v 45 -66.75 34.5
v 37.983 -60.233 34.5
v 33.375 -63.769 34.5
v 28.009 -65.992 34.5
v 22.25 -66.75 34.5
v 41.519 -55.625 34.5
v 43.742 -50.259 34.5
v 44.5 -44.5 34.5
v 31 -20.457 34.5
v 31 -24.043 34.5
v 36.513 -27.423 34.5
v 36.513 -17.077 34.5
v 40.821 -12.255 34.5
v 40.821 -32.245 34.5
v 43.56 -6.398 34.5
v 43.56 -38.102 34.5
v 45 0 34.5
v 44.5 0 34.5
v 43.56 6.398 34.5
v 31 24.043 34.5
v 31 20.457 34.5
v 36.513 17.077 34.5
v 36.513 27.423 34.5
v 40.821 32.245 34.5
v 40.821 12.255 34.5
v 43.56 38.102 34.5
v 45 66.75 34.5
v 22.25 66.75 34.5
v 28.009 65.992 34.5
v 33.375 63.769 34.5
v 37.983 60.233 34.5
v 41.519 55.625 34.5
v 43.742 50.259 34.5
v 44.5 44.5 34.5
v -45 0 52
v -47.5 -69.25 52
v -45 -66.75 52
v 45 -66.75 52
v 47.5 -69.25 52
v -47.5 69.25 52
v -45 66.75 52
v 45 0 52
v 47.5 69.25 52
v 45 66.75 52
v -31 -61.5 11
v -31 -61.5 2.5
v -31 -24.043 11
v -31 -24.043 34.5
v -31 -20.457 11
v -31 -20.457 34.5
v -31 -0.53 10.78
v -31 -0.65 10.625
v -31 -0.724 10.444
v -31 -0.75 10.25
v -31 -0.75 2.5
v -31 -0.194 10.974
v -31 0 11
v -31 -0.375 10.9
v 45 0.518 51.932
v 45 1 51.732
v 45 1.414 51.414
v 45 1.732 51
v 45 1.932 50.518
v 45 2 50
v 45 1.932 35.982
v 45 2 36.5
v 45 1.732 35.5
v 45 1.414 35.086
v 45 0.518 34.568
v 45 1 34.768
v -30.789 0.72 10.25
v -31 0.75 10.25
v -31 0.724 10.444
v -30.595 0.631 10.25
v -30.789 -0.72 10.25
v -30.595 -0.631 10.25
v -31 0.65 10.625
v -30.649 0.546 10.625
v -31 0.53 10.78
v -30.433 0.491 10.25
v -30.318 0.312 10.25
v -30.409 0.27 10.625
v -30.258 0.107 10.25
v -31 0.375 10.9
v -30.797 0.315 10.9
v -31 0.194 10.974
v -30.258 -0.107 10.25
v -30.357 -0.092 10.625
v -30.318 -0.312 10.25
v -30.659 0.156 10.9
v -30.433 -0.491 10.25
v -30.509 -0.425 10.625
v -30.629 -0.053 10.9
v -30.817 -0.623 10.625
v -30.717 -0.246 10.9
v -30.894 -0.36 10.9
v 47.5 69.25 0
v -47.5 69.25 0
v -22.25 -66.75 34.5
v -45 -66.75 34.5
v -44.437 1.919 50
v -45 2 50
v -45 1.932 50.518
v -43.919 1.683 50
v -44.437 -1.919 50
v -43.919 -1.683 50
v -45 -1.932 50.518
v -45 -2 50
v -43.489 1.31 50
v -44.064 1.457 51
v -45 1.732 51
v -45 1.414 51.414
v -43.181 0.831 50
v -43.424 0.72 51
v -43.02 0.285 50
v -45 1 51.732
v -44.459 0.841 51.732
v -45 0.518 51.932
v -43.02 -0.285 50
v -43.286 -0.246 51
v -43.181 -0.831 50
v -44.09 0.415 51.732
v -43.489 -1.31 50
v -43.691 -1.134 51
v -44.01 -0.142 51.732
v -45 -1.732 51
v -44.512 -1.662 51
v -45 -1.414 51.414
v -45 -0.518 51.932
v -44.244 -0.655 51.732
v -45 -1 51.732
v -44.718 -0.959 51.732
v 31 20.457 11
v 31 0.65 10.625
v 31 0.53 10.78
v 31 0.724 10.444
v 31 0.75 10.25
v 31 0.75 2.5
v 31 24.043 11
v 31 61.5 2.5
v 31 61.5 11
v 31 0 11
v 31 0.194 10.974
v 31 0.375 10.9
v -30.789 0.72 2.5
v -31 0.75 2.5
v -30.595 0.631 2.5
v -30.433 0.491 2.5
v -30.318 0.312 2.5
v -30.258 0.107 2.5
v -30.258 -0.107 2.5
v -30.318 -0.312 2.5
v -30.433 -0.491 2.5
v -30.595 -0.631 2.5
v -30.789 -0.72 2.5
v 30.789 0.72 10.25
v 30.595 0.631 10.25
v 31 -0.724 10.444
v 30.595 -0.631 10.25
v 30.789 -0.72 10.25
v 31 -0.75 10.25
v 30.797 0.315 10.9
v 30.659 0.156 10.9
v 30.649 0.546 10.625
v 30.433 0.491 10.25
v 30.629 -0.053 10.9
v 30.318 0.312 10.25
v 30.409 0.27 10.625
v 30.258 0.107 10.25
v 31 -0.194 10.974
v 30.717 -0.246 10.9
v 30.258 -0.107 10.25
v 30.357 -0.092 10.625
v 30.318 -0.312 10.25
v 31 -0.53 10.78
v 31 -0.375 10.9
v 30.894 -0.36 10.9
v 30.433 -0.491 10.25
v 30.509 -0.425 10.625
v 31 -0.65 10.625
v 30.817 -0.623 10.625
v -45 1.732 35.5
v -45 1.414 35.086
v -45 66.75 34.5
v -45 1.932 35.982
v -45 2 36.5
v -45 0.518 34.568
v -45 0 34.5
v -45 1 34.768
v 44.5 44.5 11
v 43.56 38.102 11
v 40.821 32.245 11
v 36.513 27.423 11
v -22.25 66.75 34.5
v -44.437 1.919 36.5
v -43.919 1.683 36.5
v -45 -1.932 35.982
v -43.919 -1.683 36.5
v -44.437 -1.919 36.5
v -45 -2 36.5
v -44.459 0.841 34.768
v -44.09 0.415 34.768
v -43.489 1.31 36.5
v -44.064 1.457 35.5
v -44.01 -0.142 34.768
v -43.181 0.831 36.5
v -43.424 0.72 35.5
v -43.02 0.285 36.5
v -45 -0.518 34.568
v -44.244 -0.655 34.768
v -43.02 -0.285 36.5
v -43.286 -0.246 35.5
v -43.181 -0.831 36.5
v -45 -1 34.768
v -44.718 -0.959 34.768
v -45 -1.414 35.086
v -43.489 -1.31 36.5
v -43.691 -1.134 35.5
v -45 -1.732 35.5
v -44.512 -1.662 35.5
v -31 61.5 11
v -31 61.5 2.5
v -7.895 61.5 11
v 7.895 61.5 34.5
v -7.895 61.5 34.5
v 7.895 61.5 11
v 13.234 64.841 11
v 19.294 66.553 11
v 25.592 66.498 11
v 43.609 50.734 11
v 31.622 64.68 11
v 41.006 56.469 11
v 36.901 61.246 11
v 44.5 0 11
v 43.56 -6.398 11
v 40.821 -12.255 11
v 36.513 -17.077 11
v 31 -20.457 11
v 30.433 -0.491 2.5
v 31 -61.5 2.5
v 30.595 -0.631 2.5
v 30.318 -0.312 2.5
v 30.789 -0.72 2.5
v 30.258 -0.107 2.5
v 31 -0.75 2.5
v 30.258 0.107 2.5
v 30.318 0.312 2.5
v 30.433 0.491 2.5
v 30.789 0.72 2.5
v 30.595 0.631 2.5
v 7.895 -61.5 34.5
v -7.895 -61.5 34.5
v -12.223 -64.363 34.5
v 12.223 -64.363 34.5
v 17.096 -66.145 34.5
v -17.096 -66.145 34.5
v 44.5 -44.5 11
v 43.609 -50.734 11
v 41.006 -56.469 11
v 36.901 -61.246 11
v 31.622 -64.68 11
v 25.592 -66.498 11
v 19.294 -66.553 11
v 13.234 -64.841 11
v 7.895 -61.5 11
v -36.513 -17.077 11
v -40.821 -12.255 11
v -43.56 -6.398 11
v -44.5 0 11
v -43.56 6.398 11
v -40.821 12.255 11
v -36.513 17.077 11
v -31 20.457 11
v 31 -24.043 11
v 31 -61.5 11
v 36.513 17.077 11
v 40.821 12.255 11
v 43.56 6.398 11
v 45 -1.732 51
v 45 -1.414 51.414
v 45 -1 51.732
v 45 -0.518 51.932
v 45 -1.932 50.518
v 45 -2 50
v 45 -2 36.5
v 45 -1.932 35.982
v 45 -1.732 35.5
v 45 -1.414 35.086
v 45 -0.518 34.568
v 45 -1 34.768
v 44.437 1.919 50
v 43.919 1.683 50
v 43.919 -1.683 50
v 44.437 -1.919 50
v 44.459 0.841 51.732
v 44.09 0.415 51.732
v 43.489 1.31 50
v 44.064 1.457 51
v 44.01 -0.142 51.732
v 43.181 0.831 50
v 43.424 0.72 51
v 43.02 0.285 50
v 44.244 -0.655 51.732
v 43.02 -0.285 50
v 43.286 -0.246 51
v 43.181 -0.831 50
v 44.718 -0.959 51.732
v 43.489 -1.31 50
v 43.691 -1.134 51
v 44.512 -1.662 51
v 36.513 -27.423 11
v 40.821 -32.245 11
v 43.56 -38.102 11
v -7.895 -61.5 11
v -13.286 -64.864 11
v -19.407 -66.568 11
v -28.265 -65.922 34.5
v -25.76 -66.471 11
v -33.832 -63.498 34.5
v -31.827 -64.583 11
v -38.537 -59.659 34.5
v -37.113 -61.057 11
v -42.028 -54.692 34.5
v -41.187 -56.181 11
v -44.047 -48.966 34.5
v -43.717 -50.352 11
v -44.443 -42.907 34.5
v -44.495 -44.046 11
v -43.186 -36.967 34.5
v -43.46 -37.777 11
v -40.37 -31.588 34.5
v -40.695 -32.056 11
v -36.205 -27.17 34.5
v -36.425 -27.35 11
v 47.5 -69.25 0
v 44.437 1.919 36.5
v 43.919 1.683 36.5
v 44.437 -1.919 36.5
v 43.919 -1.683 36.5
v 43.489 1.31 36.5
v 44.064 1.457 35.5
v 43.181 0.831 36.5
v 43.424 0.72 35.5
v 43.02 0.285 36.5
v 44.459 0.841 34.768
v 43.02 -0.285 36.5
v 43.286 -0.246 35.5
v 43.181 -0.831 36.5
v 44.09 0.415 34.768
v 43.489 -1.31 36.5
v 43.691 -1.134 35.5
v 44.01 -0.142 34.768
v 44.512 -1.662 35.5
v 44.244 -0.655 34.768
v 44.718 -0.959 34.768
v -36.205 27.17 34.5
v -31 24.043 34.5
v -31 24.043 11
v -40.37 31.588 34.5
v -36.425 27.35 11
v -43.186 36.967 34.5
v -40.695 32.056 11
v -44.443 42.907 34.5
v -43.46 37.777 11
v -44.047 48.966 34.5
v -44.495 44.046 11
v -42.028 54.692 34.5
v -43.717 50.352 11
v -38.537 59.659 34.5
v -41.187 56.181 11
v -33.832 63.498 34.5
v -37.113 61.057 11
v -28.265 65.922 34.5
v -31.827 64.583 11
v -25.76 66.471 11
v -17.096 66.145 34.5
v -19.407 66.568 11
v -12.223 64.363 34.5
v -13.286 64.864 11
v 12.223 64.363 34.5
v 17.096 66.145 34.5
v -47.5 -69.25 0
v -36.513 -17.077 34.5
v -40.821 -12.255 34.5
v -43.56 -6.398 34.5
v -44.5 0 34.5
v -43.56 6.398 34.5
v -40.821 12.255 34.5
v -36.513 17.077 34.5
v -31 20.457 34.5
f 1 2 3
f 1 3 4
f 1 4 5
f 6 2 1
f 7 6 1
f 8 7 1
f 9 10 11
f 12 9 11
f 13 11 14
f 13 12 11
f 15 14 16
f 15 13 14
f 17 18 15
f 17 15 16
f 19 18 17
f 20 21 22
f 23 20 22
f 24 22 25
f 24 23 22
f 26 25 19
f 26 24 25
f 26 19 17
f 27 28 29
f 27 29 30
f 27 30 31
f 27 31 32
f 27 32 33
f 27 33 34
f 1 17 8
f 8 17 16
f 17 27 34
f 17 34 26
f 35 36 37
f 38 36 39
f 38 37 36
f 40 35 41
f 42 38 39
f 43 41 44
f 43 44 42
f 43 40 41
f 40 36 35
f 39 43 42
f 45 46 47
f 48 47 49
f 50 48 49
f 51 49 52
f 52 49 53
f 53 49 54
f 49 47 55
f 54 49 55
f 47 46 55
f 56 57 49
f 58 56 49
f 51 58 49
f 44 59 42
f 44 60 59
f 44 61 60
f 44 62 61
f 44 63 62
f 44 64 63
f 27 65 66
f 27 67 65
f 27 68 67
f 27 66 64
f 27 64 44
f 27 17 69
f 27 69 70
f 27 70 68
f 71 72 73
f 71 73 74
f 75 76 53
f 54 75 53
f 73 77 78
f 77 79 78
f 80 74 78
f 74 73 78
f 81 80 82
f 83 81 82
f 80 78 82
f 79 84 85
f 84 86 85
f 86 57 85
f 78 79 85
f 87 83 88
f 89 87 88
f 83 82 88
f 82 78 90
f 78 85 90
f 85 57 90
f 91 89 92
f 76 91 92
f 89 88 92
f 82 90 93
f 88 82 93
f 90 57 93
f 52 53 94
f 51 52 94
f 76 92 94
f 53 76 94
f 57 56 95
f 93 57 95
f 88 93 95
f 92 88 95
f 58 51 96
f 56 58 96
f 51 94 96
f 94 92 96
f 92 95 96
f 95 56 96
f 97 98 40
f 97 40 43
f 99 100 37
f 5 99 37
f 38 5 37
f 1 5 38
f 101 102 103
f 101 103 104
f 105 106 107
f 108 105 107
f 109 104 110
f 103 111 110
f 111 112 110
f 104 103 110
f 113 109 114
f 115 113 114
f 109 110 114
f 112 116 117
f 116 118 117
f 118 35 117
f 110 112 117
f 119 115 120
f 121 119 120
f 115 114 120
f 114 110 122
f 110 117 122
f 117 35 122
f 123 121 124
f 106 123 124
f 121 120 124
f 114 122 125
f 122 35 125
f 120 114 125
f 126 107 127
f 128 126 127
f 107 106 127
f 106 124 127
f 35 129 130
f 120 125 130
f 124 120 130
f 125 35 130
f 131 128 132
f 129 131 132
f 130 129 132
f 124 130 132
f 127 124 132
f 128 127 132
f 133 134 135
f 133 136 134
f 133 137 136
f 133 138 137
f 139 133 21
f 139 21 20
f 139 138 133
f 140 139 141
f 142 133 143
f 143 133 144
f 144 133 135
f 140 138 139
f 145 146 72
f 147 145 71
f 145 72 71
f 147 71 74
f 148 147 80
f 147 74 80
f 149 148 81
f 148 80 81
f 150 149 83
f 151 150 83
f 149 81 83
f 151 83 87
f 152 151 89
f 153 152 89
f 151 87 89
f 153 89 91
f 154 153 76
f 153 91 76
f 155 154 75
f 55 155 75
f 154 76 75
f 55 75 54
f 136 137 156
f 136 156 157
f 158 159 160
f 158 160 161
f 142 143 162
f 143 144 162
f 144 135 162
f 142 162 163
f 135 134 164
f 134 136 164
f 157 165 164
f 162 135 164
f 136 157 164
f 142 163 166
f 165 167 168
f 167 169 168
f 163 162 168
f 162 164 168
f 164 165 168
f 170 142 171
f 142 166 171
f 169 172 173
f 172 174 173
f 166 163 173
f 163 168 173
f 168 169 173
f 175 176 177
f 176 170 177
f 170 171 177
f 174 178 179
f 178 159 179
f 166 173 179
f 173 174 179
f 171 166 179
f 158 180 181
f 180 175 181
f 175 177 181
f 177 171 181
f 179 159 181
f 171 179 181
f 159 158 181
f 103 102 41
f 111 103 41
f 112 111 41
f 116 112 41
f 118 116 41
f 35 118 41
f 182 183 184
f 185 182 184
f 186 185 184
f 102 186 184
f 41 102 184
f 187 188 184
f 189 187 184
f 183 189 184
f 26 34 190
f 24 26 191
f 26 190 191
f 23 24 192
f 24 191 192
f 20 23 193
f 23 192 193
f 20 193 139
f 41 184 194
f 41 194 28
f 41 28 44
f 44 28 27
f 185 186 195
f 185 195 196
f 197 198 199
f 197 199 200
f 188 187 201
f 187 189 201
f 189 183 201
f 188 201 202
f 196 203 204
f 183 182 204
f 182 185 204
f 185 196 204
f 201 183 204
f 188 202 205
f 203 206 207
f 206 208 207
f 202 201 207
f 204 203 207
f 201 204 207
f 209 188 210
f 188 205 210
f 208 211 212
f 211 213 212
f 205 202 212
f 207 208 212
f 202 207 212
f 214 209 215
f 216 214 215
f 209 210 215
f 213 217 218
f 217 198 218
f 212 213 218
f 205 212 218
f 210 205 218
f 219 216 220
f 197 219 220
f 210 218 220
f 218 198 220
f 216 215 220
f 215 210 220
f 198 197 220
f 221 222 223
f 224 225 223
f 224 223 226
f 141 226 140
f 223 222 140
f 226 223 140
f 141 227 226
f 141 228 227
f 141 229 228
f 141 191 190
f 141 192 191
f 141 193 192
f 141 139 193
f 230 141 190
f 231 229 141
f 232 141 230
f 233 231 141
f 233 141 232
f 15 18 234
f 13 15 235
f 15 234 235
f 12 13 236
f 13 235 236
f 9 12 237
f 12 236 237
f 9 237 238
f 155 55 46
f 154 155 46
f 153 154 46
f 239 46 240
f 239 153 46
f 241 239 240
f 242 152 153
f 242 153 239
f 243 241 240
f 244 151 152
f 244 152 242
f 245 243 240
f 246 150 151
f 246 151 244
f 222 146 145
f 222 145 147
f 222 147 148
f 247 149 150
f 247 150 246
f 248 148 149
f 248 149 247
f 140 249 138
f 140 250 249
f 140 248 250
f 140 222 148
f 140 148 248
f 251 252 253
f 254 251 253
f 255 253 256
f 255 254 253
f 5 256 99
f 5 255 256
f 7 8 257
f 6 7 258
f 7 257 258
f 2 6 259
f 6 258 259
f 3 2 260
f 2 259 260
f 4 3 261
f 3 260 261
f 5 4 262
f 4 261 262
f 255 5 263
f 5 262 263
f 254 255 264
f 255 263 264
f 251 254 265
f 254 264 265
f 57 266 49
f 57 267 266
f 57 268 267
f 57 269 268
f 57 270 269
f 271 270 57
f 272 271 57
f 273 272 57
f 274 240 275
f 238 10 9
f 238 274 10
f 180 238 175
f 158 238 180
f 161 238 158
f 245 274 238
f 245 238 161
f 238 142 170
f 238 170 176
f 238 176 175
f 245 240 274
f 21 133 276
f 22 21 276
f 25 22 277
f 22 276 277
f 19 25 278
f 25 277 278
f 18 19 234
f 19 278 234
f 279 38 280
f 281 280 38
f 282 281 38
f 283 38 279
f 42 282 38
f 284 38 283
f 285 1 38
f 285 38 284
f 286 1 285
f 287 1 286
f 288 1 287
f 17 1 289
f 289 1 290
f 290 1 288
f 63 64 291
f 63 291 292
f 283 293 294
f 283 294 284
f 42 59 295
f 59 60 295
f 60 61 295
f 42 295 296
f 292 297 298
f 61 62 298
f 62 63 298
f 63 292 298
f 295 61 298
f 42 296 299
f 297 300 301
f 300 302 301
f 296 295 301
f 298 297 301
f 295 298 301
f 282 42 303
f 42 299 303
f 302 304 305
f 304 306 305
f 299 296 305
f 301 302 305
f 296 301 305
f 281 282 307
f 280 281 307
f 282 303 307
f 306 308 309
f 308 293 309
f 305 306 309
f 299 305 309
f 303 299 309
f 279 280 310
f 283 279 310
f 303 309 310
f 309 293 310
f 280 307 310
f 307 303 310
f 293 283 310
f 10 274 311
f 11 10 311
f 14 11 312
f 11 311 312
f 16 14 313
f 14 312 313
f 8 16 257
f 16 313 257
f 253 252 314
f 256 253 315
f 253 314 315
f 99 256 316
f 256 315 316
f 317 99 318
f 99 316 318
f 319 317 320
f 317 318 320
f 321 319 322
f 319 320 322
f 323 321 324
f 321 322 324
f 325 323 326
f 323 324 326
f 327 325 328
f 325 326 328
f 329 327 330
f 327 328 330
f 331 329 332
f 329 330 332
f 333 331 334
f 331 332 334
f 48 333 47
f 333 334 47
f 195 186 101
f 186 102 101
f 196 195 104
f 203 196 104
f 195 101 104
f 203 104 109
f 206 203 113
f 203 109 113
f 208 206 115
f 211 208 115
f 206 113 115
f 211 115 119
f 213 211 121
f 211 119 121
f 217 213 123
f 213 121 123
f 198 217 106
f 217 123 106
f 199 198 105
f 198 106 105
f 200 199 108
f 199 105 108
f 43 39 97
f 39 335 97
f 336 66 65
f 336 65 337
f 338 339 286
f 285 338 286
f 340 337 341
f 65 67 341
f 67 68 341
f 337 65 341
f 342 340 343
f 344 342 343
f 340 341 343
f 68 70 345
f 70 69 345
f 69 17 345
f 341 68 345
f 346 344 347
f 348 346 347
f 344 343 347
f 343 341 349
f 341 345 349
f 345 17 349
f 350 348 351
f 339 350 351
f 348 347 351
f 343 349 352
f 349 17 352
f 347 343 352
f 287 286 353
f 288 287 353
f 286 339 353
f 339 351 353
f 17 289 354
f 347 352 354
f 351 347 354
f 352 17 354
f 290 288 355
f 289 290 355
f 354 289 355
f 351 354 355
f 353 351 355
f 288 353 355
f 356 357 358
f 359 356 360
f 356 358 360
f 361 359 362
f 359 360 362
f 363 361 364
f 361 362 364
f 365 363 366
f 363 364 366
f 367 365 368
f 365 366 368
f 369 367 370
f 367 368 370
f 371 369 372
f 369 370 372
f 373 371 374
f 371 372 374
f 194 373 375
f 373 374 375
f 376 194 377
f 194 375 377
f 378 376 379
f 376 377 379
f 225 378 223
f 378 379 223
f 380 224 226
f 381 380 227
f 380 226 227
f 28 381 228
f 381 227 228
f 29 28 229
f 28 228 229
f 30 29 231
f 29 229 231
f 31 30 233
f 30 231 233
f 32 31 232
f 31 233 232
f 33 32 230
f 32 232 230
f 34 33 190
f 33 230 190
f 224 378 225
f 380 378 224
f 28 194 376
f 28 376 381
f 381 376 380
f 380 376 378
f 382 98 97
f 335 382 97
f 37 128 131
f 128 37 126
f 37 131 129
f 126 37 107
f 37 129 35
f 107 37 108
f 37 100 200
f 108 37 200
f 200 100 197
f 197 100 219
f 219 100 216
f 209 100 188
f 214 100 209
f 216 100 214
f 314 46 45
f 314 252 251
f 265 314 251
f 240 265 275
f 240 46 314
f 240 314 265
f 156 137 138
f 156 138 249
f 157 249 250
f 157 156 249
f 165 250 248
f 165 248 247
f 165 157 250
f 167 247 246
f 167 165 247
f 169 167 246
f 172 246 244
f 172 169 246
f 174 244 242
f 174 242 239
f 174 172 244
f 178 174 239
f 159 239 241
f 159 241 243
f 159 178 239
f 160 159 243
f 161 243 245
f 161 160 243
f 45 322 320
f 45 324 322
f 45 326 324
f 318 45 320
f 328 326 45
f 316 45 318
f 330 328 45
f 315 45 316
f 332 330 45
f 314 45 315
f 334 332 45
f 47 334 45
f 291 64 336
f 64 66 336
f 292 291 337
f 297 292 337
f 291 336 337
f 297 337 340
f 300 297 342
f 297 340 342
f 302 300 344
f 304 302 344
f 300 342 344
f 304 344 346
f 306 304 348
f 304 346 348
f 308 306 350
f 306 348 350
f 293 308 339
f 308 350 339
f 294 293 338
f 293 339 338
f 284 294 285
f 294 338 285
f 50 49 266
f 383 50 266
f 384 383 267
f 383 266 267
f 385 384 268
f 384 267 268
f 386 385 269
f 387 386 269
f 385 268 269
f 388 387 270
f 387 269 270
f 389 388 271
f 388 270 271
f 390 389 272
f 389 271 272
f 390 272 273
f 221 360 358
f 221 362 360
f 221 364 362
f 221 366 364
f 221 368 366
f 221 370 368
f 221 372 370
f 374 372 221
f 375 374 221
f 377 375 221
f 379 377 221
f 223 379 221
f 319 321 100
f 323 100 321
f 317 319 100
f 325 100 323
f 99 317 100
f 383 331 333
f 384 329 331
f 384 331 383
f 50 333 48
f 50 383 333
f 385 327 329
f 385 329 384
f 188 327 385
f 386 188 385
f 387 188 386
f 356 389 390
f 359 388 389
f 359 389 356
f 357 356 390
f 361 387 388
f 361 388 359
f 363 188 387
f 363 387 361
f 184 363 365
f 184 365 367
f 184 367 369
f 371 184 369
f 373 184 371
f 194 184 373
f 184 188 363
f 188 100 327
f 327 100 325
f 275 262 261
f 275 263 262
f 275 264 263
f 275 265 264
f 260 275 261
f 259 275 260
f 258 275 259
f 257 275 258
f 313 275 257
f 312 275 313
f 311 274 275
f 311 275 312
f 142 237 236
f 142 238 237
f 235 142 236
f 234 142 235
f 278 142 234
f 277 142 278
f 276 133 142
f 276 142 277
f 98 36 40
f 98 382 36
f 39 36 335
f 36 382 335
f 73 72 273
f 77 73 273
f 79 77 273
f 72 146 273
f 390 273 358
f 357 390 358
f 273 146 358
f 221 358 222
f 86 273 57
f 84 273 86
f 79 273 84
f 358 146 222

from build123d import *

# Parameters (mm, degrees)
F0_W      = 95
F0_H      = 138.5
F1_DEPTH  = 2.5
F2_W      = 95
F2_H      = 138.5
F2_W_2    = 62
F2_H_2    = 123
F3_DEPTH  = 8.5
F4_W      = 95
F4_H      = 138.5
F5_DEPTH  = 23.5
F6_W      = 62
F6_H      = 123
F7_DEPTH  = 23.501
F8_W      = 95
F8_H      = 138.5
F8_W_2    = 90
F8_H_2    = 133.5
F9_DEPTH  = 17.5
F11_ANGLE = 180
F13_ANGLE = 180
F14_W     = 0.75
F14_H     = 7.75
F16_W     = 0.75
F16_H     = 7.75


with BuildPart() as f1:
    # F0 (on Top) → F1 (new body)
    with BuildSketch(Plane.XY):
        Rectangle(F0_W, F0_H)
    extrude(amount=F1_DEPTH)

    # F2 (on face) → F3 (join)
    with BuildSketch(Plane.XY.offset(2.5)):
        Rectangle(F2_W, F2_H)
        Rectangle(F2_W_2, F2_H_2, mode=Mode.SUBTRACT)
    extrude(amount=F3_DEPTH)

    # F4 (on face) → F5 (join)
    with BuildSketch(Plane.XY.offset(11)):
        with BuildLine():
            ThreePointArc((-22.25, 22.25), (-6.516874, 28.766874), (0, 44.5))
            ThreePointArc((0, 44.5), (-37.983126, 60.233126), (-22.25, 22.25))
        make_face()
        with BuildLine():
            ThreePointArc((44.5, 44.5), (22.25, 66.75), (0, 44.5))
            ThreePointArc((0, 44.5), (6.516874, 28.766874), (22.25, 22.25))
            ThreePointArc((22.25, 22.25), (37.983126, 28.766874), (44.5, 44.5))
        make_face()
        with BuildLine():
            ThreePointArc((0, 0), (-6.516874, 15.733126), (-22.25, 22.25))
            ThreePointArc((-22.25, 22.25), (-44.5, 0), (-22.25, -22.25))
            ThreePointArc((-22.25, -22.25), (-6.516874, -15.733126), (0, 0))
        make_face()
        with BuildLine():
            ThreePointArc((44.5, 0), (37.983126, 15.733126), (22.25, 22.25))
            ThreePointArc((22.25, 22.25), (6.516874, 15.733126), (0, 0))
            ThreePointArc((0, 0), (6.516874, -15.733126), (22.25, -22.25))
            ThreePointArc((22.25, -22.25), (37.983126, -15.733126), (44.5, 0))
        make_face()
        with BuildLine():
            ThreePointArc((0, -44.5), (-6.516874, -28.766874), (-22.25, -22.25))
            ThreePointArc((-22.25, -22.25), (-37.983126, -60.233126), (0, -44.5))
        make_face()
        with BuildLine():
            ThreePointArc((44.5, -44.5), (37.983126, -28.766874), (22.25, -22.25))
            ThreePointArc((22.25, -22.25), (6.516874, -28.766874), (0, -44.5))
            ThreePointArc((0, -44.5), (22.25, -66.75), (44.5, -44.5))
        make_face()
        Rectangle(F4_W, F4_H)
        with BuildLine():
            ThreePointArc((-22.25, 22.25), (-37.983126, 60.233126), (0, 44.5))
            ThreePointArc((0, 44.5), (22.25, 66.75), (44.5, 44.5))
            ThreePointArc((44.5, 44.5), (37.983126, 28.766874), (22.25, 22.25))
            ThreePointArc((22.25, 22.25), (37.983126, 15.733126), (44.5, 0))
            ThreePointArc((44.5, 0), (37.983126, -15.733126), (22.25, -22.25))
            ThreePointArc((22.25, -22.25), (37.983126, -28.766874), (44.5, -44.5))
            ThreePointArc((44.5, -44.5), (22.25, -66.75), (0, -44.5))
            ThreePointArc((0, -44.5), (-37.983126, -60.233126), (-22.25, -22.25))
            ThreePointArc((-22.25, -22.25), (-44.5, 0), (-22.25, 22.25))
        make_face(mode=Mode.SUBTRACT)
    extrude(amount=F5_DEPTH)

    # F6 (on face) → F7 (cut, through all)
    with BuildSketch(Plane.XY.offset(11)):
        Rectangle(F6_W, F6_H)
    extrude(amount=F7_DEPTH, mode=Mode.SUBTRACT)

    # F8 (on face) → F9 (join)
    with BuildSketch(Plane.XY.offset(34.5)):
        Rectangle(F8_W, F8_H)
        Rectangle(F8_W_2, F8_H_2, mode=Mode.SUBTRACT)
    extrude(amount=F9_DEPTH)

    # F10 (on face) → F11 (revolve)
    with BuildSketch(Plane.YZ.offset(-45)):
        with BuildLine():
            Line((0, 36.5), (0, 34.5))
            ThreePointArc((0, 34.5), (1.414214, 35.085786), (2, 36.5))
            Line((2, 36.5), (2, 50))
            ThreePointArc((2, 50), (1.414214, 51.414214), (0, 52))
            Line((0, 52), (0, 50))
            Line((0, 50), (0, 36.5))
        make_face()
    revolve(axis=Axis((-45, 0, 43.25), (0, 0, -1)), revolution_arc=F11_ANGLE)

    # F12 (on face) → F13 (revolve)
    with BuildSketch(Plane(origin=(45, 0, 0), x_dir=(0, -1, 0), z_dir=(-1, 0, 0))):
        with BuildLine():
            ThreePointArc((-2, 36.5), (-1.414214, 35.085786), (0, 34.5))
            Line((0, 34.5), (0, 36.5))
            Line((0, 36.5), (0, 50))
            Line((0, 50), (-2, 50))
            Line((-2, 50), (-2, 36.5))
        make_face()
        with BuildLine():
            Line((-2, 50), (0, 50))
            Line((0, 50), (0, 52))
            ThreePointArc((0, 52), (-1.414214, 51.414214), (-2, 50))
        make_face()
    revolve(axis=Axis((45, 0, 43.25), (0, 0, 1)), revolution_arc=F13_ANGLE)

    # F14 (on face) → F15 (revolve)
    with BuildSketch(Plane.YZ.offset(-31)):
        with BuildLine():
            ThreePointArc((0.75, 10.25), (0.53033, 10.78033), (0, 11))
            Line((0, 11), (0, 10.25))
            Line((0, 10.25), (0.75, 10.25))
        make_face()
        with Locations((0.375, 6.375)):
            Rectangle(F14_W, F14_H)
    revolve(axis=Axis((-31, 0, 6.75), (0, 0, -1)))

    # F16 (on face) → F17 (revolve)
    with BuildSketch(Plane(origin=(31, 0, 0), x_dir=(0, -1, 0), z_dir=(-1, 0, 0))):
        with Locations((-0.375, 6.375)):
            Rectangle(F16_W, F16_H)
        with BuildLine():
            Line((-0.75, 10.25), (0, 10.25))
            Line((0, 10.25), (0, 11))
            ThreePointArc((0, 11), (-0.53033, 10.78033), (-0.75, 10.25))
        make_face()
    revolve(axis=Axis((31, 0, 6.75), (0, 0, 1)))


solid = f1.part
